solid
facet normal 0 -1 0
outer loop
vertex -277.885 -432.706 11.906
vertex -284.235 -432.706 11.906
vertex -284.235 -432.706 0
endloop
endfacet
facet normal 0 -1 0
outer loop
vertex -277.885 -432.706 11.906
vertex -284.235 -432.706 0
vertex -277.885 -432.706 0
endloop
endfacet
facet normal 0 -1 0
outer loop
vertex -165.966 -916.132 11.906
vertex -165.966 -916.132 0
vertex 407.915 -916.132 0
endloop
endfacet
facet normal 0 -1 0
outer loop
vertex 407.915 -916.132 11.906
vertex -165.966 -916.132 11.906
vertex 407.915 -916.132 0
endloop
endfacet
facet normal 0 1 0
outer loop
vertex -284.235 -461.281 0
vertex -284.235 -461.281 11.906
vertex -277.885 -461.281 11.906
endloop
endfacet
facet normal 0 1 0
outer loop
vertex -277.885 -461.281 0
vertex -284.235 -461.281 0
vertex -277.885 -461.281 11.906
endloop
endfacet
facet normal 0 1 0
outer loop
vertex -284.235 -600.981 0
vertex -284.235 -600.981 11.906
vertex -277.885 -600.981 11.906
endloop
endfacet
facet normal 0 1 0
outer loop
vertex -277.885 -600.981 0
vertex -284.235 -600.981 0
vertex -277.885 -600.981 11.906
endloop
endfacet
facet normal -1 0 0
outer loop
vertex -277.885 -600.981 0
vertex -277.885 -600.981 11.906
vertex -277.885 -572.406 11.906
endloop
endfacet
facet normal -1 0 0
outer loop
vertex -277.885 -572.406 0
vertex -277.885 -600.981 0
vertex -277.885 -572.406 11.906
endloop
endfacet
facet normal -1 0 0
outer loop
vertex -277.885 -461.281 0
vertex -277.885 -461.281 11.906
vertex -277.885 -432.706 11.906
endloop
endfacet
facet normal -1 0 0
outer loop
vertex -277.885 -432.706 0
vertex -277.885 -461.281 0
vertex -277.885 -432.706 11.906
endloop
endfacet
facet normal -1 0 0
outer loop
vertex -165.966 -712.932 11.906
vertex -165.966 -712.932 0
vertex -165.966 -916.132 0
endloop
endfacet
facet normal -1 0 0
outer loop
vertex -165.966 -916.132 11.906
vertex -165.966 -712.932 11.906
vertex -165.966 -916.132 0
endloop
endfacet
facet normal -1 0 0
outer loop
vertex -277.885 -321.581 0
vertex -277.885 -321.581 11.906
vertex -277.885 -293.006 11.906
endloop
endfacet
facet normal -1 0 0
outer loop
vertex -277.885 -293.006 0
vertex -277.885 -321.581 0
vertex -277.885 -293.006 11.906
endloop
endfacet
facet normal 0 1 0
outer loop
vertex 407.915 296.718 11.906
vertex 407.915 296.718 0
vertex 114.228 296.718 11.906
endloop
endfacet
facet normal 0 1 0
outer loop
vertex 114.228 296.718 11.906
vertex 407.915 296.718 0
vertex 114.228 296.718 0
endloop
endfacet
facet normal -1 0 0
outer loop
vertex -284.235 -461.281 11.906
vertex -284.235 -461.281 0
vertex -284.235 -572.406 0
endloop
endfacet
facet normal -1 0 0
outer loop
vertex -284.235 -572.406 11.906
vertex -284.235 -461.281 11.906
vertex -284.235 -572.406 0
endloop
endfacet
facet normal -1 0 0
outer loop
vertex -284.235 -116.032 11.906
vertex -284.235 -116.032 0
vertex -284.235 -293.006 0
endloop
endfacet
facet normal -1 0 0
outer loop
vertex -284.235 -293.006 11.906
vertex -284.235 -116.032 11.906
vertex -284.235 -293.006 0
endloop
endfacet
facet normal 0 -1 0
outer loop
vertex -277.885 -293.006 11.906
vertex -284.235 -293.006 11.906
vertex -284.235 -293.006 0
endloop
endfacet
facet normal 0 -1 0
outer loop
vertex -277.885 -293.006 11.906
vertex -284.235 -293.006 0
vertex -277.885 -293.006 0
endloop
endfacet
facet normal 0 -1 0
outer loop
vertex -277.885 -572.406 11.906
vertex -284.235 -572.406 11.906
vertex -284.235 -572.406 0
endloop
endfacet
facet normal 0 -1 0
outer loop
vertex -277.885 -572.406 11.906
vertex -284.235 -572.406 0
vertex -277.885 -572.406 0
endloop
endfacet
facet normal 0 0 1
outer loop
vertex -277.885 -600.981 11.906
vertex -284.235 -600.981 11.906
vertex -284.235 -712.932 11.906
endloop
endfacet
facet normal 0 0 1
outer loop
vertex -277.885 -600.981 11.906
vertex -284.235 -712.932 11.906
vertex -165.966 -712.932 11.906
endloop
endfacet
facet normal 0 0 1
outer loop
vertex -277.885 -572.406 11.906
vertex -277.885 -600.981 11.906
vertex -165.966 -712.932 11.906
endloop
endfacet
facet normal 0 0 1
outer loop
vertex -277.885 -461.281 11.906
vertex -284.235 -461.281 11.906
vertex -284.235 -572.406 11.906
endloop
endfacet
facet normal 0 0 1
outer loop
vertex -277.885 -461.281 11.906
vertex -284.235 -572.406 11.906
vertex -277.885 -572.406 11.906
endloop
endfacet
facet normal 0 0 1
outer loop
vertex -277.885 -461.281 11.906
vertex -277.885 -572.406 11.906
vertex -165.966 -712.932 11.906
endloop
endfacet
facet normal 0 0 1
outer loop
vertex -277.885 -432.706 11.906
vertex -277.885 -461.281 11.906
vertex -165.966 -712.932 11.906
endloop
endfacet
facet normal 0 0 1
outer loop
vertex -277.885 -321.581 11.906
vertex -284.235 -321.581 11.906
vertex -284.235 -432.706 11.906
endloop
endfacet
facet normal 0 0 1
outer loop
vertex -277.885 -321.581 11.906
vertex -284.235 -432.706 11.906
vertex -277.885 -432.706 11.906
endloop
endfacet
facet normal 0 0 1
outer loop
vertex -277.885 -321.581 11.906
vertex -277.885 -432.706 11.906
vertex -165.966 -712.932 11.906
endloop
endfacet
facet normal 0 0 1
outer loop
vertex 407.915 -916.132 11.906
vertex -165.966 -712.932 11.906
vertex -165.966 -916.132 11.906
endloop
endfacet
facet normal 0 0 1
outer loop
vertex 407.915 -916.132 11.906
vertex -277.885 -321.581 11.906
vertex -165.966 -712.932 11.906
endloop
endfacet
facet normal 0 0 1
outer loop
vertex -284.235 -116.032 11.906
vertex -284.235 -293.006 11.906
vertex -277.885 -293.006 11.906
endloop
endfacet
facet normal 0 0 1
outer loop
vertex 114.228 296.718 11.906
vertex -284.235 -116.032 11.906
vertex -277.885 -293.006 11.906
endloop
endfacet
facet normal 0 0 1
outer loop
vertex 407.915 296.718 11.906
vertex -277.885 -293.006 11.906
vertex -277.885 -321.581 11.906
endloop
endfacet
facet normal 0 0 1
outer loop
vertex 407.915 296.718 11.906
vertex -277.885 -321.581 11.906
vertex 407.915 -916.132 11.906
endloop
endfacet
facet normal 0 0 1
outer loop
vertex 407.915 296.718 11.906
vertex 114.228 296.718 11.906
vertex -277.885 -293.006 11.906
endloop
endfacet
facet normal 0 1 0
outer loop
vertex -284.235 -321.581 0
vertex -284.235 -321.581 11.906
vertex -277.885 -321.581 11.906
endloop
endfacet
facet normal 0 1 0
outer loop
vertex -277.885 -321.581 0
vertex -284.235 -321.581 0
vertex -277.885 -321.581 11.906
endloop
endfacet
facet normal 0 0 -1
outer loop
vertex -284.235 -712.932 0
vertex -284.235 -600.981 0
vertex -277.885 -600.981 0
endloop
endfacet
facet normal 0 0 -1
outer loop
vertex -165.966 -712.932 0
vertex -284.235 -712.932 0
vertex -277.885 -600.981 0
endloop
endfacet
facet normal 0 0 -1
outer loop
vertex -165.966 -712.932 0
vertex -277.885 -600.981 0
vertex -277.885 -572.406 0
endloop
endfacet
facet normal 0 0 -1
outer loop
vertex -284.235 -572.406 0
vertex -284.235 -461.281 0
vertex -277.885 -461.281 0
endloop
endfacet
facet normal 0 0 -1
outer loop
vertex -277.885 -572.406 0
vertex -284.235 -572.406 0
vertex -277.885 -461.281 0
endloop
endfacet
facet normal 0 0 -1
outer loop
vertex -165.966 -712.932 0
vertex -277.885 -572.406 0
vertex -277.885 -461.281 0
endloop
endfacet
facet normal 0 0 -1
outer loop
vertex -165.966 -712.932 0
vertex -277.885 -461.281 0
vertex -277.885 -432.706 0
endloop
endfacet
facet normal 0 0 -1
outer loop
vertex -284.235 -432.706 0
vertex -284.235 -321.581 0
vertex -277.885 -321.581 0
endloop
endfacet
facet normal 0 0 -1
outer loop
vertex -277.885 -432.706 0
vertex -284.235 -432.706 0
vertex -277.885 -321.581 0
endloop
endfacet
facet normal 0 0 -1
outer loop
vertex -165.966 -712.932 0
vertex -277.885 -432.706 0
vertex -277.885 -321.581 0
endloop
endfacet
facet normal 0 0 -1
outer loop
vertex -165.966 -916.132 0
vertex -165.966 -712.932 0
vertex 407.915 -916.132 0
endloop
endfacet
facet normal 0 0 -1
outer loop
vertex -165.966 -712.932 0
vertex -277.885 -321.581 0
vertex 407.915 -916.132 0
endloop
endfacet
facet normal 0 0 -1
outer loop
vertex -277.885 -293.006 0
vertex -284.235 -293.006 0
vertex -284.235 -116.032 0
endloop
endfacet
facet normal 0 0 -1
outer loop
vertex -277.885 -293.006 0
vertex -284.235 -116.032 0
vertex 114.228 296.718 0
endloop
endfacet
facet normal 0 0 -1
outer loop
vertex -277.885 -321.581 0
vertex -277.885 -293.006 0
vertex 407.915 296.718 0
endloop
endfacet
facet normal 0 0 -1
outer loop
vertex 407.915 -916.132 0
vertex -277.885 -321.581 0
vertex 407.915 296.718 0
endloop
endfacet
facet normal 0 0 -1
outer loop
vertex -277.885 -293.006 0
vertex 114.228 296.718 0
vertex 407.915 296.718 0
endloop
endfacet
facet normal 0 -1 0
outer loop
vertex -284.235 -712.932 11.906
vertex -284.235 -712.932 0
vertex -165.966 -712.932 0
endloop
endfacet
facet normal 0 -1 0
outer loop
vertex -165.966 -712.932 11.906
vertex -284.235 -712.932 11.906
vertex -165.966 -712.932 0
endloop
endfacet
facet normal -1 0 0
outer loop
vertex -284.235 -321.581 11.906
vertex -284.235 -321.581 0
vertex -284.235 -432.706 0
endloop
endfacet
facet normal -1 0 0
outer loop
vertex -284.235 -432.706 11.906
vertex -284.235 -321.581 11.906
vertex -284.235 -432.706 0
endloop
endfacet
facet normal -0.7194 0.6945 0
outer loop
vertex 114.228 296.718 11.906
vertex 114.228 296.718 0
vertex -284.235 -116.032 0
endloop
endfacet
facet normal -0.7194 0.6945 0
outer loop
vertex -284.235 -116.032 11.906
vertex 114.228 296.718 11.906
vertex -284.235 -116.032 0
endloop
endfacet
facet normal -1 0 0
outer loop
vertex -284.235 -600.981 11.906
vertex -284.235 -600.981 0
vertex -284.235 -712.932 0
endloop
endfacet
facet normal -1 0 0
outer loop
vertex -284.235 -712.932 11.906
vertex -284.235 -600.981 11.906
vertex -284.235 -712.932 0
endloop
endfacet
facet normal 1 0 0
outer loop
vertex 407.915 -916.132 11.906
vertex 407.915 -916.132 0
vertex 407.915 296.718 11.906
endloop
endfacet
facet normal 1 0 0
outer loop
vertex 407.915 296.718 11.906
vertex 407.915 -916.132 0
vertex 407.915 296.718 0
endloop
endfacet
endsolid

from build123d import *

# Parameters (mm, degrees)
BOSS_EXTRUDE1_DEPTH = 11.90625
SKETCH2_W           = 6.35
SKETCH2_H           = 28.575
CUT_EXTRUDE1_DEPTH  = 12.90625


with BuildPart() as part:
    # Sketch1 → Boss-Extrude1 (new body)
    with BuildSketch(Plane.XY):
        Polygon((-284.234659091, -116.031818182), (-284.234659091, -712.931818182), (-165.965909091, -712.931818182), (-165.965909091, -916.131818182), (407.915340909, -916.131818182), (407.915340909, 296.718181818), (114.227840909, 296.718181818), align=None)
    extrude(amount=BOSS_EXTRUDE1_DEPTH)

    # Sketch2 → Cut-Extrude1 (cut, through all)
    with BuildSketch(Plane.XY.offset(11.90625)):
        with Locations((-281.059659091, -586.693818182)):
            Rectangle(SKETCH2_W, SKETCH2_H)
        with Locations((-281.059659091, -446.993818182)):
            Rectangle(SKETCH2_W, SKETCH2_H)
        with Locations((-281.059659091, -307.293818182)):
            Rectangle(SKETCH2_W, SKETCH2_H)
    extrude(amount=-CUT_EXTRUDE1_DEPTH, mode=Mode.SUBTRACT)


solid = part.part
